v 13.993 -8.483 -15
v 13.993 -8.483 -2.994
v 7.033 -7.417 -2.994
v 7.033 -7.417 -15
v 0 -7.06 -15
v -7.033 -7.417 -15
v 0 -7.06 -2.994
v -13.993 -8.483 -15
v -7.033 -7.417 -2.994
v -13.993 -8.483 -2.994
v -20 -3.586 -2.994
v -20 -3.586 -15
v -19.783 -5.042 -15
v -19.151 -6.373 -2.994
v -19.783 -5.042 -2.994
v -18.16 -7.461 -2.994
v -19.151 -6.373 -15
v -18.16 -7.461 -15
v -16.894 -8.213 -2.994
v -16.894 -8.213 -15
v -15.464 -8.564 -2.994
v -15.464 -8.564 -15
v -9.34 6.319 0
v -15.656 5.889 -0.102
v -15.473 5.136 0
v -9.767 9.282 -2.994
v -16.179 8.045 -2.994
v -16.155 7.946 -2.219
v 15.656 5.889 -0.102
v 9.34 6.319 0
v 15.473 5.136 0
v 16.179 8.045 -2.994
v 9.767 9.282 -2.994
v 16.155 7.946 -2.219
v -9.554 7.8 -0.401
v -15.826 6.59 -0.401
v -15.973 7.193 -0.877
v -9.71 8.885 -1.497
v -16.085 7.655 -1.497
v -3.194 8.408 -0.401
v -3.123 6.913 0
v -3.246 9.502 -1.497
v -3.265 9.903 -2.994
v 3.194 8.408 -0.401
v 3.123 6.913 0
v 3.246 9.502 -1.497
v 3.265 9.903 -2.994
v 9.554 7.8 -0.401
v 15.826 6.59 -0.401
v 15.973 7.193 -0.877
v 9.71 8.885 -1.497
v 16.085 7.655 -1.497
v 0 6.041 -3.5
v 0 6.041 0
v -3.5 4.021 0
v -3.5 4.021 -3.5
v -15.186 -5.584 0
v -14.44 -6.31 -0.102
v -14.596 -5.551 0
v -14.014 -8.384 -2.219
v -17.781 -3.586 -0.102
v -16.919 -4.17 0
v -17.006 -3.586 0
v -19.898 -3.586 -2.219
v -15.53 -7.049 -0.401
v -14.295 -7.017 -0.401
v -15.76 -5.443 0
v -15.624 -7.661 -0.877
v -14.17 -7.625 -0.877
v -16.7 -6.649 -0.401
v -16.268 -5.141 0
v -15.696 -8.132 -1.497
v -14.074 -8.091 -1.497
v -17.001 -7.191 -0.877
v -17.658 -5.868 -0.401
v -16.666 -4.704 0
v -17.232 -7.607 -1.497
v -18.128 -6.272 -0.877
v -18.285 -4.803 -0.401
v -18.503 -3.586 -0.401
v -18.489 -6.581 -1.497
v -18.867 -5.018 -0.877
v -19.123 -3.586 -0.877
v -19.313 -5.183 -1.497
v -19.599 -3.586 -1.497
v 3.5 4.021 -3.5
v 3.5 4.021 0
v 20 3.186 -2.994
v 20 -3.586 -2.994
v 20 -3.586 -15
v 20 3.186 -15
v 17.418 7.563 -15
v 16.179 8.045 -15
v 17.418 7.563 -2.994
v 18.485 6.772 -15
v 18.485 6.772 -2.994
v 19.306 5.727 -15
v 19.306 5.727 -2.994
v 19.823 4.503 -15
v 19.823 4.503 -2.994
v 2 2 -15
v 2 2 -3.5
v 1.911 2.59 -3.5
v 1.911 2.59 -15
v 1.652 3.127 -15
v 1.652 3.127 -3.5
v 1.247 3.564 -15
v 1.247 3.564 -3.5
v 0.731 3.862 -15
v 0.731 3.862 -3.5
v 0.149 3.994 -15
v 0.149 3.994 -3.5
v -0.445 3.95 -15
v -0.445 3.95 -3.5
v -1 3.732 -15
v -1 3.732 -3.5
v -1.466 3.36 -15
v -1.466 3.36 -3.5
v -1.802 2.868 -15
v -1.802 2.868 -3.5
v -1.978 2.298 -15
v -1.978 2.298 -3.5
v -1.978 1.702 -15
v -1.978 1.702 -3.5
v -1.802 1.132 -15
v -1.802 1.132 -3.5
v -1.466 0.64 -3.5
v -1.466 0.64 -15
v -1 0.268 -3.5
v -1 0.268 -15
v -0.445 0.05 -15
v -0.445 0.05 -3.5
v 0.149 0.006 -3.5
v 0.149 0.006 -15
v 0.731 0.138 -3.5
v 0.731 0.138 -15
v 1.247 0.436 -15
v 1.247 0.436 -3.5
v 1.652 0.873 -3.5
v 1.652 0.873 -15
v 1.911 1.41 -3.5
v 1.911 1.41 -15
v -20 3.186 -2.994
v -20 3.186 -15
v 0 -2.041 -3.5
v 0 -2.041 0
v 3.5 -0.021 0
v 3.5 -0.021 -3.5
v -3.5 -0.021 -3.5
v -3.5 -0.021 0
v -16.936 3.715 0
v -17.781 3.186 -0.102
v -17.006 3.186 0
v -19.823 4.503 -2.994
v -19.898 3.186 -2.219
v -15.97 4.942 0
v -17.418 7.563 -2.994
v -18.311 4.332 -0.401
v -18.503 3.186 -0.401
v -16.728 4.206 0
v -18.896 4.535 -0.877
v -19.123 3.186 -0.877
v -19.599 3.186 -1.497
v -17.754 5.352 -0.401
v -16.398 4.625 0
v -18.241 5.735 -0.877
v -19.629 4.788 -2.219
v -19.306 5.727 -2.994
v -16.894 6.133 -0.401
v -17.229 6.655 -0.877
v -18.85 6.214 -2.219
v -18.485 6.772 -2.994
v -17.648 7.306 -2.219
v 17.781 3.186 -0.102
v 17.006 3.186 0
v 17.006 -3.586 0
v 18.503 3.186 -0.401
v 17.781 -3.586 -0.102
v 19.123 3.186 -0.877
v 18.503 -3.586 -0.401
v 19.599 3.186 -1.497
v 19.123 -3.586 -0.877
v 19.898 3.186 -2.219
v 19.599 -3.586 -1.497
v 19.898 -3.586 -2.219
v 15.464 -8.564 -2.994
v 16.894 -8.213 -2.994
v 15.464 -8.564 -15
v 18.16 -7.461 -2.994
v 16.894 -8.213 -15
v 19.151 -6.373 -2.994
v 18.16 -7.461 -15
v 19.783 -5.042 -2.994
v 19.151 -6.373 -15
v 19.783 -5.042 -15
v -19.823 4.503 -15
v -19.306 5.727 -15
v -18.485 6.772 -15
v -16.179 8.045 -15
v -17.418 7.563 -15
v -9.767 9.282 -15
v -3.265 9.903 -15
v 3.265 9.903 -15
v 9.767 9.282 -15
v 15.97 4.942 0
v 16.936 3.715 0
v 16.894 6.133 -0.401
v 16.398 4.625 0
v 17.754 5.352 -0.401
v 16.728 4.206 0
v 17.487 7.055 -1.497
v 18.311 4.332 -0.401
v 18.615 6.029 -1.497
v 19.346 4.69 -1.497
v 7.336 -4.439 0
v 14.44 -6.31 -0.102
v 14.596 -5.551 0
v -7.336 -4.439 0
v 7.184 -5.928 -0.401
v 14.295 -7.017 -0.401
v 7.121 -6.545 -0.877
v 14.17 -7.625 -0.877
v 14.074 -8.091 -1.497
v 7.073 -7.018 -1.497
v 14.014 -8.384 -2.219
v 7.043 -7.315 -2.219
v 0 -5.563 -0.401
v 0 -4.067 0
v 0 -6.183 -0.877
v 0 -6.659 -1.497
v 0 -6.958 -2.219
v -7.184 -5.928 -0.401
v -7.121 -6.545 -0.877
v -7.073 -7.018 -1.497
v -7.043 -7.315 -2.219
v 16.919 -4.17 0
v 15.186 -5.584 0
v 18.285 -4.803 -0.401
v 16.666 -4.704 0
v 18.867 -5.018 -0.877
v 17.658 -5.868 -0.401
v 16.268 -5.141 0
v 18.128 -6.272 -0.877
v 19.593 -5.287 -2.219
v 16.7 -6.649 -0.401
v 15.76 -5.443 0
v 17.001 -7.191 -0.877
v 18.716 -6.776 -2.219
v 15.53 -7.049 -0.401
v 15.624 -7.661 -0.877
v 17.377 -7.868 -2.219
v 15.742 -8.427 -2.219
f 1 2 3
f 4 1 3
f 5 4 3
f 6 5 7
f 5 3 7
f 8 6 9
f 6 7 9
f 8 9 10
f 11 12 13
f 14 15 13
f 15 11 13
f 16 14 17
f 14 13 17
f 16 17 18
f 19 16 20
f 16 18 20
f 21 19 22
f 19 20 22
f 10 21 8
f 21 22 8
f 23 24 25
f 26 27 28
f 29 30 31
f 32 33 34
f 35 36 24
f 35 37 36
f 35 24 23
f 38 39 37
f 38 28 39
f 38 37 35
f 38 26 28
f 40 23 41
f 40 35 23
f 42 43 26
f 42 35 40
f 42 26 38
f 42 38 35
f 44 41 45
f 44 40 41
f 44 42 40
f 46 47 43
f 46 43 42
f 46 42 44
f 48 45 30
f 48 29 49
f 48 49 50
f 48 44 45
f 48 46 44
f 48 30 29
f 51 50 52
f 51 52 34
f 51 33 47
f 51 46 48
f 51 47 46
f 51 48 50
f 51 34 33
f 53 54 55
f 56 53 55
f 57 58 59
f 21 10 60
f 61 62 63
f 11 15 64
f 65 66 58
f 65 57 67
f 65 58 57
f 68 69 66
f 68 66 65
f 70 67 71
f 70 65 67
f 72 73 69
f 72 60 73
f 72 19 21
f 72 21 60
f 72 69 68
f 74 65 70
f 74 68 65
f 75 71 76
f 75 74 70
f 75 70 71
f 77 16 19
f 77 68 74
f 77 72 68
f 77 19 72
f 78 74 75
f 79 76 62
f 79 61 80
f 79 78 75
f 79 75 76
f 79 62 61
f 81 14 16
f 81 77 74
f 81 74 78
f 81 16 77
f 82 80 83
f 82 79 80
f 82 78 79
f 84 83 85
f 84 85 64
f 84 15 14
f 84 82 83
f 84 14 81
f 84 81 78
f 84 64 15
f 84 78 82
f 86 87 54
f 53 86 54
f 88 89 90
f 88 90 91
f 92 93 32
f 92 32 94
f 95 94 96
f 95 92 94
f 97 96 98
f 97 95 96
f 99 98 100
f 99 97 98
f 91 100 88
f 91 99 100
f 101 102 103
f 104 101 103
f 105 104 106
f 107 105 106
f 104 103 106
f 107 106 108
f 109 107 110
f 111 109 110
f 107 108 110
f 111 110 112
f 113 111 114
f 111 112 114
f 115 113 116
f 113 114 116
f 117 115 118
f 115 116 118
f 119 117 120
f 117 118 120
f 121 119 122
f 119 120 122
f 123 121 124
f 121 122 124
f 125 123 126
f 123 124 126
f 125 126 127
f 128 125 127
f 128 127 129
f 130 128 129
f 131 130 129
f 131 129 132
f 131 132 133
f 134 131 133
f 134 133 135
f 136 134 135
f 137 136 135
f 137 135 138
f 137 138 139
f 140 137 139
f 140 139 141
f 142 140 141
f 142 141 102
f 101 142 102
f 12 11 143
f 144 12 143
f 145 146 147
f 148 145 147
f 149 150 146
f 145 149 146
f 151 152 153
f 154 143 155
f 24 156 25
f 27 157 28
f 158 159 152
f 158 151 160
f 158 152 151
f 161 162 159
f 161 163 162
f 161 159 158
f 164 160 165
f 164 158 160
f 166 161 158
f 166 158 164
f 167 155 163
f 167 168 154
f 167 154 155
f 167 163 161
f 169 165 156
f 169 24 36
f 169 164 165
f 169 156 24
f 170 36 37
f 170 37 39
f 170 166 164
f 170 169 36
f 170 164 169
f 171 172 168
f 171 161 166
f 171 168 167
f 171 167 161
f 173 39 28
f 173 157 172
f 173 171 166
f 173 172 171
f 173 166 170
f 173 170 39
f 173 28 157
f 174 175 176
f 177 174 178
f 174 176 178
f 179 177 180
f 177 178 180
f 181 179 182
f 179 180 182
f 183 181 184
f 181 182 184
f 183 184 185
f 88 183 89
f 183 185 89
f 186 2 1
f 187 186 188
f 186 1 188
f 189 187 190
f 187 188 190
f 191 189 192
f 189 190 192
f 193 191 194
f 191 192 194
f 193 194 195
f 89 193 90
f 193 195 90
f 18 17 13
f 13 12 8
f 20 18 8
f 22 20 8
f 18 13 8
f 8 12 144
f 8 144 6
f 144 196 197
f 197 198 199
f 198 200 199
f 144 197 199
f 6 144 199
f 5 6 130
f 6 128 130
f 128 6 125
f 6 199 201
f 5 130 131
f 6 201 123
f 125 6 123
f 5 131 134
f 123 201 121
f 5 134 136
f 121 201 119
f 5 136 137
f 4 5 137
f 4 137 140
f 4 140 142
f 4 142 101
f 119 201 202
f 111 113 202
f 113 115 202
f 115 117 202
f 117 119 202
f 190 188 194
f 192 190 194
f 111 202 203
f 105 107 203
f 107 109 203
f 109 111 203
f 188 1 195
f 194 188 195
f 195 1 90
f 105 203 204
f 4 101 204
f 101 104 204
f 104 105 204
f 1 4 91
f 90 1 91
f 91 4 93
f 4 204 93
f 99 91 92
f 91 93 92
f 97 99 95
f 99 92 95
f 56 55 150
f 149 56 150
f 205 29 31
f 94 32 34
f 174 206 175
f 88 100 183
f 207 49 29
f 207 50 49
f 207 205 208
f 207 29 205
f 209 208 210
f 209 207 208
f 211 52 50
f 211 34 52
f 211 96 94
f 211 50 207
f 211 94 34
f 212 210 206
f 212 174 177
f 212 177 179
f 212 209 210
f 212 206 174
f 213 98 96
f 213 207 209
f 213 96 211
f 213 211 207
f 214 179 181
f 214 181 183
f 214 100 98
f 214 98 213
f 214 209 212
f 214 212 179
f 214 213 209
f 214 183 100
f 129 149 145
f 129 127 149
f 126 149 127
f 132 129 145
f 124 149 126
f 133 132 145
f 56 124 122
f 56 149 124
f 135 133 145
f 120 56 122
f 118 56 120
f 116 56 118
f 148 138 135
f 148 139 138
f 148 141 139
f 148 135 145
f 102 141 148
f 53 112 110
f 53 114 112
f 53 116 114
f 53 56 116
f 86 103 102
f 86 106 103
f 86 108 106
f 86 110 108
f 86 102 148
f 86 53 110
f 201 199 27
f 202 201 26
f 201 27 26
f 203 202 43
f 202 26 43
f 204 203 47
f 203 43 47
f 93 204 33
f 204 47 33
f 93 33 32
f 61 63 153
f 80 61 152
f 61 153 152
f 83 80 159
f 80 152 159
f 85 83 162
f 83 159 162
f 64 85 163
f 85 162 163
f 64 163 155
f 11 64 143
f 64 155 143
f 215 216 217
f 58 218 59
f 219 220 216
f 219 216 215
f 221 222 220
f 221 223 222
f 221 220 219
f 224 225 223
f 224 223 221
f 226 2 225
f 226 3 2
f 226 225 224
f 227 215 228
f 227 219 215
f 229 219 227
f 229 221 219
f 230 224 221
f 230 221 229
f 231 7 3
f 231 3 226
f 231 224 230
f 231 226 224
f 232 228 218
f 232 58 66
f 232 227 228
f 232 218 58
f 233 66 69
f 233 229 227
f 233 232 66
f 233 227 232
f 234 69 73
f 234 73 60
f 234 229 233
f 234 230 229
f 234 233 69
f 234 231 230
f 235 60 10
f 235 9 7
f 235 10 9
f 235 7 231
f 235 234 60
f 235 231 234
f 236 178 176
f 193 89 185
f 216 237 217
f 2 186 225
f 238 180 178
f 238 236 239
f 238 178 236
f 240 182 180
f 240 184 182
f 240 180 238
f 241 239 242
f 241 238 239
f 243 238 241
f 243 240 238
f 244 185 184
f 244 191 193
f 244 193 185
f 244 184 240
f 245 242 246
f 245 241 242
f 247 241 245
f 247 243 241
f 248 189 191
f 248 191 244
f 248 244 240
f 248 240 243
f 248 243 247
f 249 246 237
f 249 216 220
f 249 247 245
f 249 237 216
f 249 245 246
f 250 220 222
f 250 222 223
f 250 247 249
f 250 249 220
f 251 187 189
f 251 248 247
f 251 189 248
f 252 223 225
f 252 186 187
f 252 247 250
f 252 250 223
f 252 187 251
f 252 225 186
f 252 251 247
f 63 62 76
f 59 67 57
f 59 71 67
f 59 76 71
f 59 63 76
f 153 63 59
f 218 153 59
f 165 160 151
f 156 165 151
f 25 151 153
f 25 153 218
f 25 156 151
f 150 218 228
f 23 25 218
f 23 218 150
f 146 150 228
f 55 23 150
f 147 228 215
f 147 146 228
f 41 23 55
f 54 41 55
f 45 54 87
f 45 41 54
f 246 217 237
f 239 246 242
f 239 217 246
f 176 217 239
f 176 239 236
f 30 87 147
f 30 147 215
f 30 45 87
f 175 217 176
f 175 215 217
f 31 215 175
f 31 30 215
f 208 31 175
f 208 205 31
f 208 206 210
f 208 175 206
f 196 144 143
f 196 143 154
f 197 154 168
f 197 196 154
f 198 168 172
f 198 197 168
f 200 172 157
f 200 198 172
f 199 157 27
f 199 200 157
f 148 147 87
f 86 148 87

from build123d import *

# Parameters (mm, degrees)
F0_W     = 40
F0_H     = 20
F1_DEPTH = 15
F3_DEPTH = 3.5
F5_DEPTH = 15.001
F6_R     = 2
F7_DEPTH = 11.501
F8_R     = 5
F9_R     = 2.9936248173


with BuildPart() as f1:
    # F0 (on Top) → F1 (new body)
    with BuildSketch(Plane.XY):
        Rectangle(F0_W, F0_H)
    extrude(amount=-F1_DEPTH)

    # F2 (on face) → F3 (cut)
    with BuildSketch(Plane.XY):
        Polygon((3.5, -0.0207259422), (3.5, 4.0207259422), (0, 6.0414518843), (-3.5, 4.0207259422), (-3.5, -0.0207259422), (0, -2.0414518843), align=None)
    extrude(amount=-F3_DEPTH, mode=Mode.SUBTRACT)

    # F4 (on face) → F5 (cut, through all)
    with BuildSketch(Plane.XY):
        with BuildLine():
            ThreePointArc((-20, 7), (0, 9.9805733622), (20, 7))
            Line((20, 7), (20, 10))
            Line((20, 10), (-20, 10))
            Line((-20, 10), (-20, 7))
        make_face()
        with BuildLine():
            Line((-20, -10), (20, -10))
            ThreePointArc((20, -10), (0, -7.0601321922), (-20, -10))
        make_face()
    extrude(amount=-F5_DEPTH, mode=Mode.SUBTRACT)

    # F6 (on face) → F7 (cut, through all)
    with BuildSketch(Plane.XY.offset(-3.5)):
        with Locations((0, 2)):
            Circle(F6_R)
    extrude(amount=-F7_DEPTH, mode=Mode.SUBTRACT)

    # F8
    f8_edges = [f1.edges().sort_by_distance(p)[0] for p in [
        (-20, 7, -7.5),
        (20, 7, -7.5),
        (-20, -10, -7.5),
        (20, -10, -7.5),
    ]]
    fillet(f8_edges, radius=F8_R)

    # F9
    f9_edges = [f1.edges().sort_by_distance(p)[0] for p in [
        (0, 9.980573, 0),
        (-20, -0.199833, 0),
        (20, -0.199833, 0),
        (0, -7.060132, 0),
    ]]
    fillet(f9_edges, radius=F9_R)


solid = f1.part
